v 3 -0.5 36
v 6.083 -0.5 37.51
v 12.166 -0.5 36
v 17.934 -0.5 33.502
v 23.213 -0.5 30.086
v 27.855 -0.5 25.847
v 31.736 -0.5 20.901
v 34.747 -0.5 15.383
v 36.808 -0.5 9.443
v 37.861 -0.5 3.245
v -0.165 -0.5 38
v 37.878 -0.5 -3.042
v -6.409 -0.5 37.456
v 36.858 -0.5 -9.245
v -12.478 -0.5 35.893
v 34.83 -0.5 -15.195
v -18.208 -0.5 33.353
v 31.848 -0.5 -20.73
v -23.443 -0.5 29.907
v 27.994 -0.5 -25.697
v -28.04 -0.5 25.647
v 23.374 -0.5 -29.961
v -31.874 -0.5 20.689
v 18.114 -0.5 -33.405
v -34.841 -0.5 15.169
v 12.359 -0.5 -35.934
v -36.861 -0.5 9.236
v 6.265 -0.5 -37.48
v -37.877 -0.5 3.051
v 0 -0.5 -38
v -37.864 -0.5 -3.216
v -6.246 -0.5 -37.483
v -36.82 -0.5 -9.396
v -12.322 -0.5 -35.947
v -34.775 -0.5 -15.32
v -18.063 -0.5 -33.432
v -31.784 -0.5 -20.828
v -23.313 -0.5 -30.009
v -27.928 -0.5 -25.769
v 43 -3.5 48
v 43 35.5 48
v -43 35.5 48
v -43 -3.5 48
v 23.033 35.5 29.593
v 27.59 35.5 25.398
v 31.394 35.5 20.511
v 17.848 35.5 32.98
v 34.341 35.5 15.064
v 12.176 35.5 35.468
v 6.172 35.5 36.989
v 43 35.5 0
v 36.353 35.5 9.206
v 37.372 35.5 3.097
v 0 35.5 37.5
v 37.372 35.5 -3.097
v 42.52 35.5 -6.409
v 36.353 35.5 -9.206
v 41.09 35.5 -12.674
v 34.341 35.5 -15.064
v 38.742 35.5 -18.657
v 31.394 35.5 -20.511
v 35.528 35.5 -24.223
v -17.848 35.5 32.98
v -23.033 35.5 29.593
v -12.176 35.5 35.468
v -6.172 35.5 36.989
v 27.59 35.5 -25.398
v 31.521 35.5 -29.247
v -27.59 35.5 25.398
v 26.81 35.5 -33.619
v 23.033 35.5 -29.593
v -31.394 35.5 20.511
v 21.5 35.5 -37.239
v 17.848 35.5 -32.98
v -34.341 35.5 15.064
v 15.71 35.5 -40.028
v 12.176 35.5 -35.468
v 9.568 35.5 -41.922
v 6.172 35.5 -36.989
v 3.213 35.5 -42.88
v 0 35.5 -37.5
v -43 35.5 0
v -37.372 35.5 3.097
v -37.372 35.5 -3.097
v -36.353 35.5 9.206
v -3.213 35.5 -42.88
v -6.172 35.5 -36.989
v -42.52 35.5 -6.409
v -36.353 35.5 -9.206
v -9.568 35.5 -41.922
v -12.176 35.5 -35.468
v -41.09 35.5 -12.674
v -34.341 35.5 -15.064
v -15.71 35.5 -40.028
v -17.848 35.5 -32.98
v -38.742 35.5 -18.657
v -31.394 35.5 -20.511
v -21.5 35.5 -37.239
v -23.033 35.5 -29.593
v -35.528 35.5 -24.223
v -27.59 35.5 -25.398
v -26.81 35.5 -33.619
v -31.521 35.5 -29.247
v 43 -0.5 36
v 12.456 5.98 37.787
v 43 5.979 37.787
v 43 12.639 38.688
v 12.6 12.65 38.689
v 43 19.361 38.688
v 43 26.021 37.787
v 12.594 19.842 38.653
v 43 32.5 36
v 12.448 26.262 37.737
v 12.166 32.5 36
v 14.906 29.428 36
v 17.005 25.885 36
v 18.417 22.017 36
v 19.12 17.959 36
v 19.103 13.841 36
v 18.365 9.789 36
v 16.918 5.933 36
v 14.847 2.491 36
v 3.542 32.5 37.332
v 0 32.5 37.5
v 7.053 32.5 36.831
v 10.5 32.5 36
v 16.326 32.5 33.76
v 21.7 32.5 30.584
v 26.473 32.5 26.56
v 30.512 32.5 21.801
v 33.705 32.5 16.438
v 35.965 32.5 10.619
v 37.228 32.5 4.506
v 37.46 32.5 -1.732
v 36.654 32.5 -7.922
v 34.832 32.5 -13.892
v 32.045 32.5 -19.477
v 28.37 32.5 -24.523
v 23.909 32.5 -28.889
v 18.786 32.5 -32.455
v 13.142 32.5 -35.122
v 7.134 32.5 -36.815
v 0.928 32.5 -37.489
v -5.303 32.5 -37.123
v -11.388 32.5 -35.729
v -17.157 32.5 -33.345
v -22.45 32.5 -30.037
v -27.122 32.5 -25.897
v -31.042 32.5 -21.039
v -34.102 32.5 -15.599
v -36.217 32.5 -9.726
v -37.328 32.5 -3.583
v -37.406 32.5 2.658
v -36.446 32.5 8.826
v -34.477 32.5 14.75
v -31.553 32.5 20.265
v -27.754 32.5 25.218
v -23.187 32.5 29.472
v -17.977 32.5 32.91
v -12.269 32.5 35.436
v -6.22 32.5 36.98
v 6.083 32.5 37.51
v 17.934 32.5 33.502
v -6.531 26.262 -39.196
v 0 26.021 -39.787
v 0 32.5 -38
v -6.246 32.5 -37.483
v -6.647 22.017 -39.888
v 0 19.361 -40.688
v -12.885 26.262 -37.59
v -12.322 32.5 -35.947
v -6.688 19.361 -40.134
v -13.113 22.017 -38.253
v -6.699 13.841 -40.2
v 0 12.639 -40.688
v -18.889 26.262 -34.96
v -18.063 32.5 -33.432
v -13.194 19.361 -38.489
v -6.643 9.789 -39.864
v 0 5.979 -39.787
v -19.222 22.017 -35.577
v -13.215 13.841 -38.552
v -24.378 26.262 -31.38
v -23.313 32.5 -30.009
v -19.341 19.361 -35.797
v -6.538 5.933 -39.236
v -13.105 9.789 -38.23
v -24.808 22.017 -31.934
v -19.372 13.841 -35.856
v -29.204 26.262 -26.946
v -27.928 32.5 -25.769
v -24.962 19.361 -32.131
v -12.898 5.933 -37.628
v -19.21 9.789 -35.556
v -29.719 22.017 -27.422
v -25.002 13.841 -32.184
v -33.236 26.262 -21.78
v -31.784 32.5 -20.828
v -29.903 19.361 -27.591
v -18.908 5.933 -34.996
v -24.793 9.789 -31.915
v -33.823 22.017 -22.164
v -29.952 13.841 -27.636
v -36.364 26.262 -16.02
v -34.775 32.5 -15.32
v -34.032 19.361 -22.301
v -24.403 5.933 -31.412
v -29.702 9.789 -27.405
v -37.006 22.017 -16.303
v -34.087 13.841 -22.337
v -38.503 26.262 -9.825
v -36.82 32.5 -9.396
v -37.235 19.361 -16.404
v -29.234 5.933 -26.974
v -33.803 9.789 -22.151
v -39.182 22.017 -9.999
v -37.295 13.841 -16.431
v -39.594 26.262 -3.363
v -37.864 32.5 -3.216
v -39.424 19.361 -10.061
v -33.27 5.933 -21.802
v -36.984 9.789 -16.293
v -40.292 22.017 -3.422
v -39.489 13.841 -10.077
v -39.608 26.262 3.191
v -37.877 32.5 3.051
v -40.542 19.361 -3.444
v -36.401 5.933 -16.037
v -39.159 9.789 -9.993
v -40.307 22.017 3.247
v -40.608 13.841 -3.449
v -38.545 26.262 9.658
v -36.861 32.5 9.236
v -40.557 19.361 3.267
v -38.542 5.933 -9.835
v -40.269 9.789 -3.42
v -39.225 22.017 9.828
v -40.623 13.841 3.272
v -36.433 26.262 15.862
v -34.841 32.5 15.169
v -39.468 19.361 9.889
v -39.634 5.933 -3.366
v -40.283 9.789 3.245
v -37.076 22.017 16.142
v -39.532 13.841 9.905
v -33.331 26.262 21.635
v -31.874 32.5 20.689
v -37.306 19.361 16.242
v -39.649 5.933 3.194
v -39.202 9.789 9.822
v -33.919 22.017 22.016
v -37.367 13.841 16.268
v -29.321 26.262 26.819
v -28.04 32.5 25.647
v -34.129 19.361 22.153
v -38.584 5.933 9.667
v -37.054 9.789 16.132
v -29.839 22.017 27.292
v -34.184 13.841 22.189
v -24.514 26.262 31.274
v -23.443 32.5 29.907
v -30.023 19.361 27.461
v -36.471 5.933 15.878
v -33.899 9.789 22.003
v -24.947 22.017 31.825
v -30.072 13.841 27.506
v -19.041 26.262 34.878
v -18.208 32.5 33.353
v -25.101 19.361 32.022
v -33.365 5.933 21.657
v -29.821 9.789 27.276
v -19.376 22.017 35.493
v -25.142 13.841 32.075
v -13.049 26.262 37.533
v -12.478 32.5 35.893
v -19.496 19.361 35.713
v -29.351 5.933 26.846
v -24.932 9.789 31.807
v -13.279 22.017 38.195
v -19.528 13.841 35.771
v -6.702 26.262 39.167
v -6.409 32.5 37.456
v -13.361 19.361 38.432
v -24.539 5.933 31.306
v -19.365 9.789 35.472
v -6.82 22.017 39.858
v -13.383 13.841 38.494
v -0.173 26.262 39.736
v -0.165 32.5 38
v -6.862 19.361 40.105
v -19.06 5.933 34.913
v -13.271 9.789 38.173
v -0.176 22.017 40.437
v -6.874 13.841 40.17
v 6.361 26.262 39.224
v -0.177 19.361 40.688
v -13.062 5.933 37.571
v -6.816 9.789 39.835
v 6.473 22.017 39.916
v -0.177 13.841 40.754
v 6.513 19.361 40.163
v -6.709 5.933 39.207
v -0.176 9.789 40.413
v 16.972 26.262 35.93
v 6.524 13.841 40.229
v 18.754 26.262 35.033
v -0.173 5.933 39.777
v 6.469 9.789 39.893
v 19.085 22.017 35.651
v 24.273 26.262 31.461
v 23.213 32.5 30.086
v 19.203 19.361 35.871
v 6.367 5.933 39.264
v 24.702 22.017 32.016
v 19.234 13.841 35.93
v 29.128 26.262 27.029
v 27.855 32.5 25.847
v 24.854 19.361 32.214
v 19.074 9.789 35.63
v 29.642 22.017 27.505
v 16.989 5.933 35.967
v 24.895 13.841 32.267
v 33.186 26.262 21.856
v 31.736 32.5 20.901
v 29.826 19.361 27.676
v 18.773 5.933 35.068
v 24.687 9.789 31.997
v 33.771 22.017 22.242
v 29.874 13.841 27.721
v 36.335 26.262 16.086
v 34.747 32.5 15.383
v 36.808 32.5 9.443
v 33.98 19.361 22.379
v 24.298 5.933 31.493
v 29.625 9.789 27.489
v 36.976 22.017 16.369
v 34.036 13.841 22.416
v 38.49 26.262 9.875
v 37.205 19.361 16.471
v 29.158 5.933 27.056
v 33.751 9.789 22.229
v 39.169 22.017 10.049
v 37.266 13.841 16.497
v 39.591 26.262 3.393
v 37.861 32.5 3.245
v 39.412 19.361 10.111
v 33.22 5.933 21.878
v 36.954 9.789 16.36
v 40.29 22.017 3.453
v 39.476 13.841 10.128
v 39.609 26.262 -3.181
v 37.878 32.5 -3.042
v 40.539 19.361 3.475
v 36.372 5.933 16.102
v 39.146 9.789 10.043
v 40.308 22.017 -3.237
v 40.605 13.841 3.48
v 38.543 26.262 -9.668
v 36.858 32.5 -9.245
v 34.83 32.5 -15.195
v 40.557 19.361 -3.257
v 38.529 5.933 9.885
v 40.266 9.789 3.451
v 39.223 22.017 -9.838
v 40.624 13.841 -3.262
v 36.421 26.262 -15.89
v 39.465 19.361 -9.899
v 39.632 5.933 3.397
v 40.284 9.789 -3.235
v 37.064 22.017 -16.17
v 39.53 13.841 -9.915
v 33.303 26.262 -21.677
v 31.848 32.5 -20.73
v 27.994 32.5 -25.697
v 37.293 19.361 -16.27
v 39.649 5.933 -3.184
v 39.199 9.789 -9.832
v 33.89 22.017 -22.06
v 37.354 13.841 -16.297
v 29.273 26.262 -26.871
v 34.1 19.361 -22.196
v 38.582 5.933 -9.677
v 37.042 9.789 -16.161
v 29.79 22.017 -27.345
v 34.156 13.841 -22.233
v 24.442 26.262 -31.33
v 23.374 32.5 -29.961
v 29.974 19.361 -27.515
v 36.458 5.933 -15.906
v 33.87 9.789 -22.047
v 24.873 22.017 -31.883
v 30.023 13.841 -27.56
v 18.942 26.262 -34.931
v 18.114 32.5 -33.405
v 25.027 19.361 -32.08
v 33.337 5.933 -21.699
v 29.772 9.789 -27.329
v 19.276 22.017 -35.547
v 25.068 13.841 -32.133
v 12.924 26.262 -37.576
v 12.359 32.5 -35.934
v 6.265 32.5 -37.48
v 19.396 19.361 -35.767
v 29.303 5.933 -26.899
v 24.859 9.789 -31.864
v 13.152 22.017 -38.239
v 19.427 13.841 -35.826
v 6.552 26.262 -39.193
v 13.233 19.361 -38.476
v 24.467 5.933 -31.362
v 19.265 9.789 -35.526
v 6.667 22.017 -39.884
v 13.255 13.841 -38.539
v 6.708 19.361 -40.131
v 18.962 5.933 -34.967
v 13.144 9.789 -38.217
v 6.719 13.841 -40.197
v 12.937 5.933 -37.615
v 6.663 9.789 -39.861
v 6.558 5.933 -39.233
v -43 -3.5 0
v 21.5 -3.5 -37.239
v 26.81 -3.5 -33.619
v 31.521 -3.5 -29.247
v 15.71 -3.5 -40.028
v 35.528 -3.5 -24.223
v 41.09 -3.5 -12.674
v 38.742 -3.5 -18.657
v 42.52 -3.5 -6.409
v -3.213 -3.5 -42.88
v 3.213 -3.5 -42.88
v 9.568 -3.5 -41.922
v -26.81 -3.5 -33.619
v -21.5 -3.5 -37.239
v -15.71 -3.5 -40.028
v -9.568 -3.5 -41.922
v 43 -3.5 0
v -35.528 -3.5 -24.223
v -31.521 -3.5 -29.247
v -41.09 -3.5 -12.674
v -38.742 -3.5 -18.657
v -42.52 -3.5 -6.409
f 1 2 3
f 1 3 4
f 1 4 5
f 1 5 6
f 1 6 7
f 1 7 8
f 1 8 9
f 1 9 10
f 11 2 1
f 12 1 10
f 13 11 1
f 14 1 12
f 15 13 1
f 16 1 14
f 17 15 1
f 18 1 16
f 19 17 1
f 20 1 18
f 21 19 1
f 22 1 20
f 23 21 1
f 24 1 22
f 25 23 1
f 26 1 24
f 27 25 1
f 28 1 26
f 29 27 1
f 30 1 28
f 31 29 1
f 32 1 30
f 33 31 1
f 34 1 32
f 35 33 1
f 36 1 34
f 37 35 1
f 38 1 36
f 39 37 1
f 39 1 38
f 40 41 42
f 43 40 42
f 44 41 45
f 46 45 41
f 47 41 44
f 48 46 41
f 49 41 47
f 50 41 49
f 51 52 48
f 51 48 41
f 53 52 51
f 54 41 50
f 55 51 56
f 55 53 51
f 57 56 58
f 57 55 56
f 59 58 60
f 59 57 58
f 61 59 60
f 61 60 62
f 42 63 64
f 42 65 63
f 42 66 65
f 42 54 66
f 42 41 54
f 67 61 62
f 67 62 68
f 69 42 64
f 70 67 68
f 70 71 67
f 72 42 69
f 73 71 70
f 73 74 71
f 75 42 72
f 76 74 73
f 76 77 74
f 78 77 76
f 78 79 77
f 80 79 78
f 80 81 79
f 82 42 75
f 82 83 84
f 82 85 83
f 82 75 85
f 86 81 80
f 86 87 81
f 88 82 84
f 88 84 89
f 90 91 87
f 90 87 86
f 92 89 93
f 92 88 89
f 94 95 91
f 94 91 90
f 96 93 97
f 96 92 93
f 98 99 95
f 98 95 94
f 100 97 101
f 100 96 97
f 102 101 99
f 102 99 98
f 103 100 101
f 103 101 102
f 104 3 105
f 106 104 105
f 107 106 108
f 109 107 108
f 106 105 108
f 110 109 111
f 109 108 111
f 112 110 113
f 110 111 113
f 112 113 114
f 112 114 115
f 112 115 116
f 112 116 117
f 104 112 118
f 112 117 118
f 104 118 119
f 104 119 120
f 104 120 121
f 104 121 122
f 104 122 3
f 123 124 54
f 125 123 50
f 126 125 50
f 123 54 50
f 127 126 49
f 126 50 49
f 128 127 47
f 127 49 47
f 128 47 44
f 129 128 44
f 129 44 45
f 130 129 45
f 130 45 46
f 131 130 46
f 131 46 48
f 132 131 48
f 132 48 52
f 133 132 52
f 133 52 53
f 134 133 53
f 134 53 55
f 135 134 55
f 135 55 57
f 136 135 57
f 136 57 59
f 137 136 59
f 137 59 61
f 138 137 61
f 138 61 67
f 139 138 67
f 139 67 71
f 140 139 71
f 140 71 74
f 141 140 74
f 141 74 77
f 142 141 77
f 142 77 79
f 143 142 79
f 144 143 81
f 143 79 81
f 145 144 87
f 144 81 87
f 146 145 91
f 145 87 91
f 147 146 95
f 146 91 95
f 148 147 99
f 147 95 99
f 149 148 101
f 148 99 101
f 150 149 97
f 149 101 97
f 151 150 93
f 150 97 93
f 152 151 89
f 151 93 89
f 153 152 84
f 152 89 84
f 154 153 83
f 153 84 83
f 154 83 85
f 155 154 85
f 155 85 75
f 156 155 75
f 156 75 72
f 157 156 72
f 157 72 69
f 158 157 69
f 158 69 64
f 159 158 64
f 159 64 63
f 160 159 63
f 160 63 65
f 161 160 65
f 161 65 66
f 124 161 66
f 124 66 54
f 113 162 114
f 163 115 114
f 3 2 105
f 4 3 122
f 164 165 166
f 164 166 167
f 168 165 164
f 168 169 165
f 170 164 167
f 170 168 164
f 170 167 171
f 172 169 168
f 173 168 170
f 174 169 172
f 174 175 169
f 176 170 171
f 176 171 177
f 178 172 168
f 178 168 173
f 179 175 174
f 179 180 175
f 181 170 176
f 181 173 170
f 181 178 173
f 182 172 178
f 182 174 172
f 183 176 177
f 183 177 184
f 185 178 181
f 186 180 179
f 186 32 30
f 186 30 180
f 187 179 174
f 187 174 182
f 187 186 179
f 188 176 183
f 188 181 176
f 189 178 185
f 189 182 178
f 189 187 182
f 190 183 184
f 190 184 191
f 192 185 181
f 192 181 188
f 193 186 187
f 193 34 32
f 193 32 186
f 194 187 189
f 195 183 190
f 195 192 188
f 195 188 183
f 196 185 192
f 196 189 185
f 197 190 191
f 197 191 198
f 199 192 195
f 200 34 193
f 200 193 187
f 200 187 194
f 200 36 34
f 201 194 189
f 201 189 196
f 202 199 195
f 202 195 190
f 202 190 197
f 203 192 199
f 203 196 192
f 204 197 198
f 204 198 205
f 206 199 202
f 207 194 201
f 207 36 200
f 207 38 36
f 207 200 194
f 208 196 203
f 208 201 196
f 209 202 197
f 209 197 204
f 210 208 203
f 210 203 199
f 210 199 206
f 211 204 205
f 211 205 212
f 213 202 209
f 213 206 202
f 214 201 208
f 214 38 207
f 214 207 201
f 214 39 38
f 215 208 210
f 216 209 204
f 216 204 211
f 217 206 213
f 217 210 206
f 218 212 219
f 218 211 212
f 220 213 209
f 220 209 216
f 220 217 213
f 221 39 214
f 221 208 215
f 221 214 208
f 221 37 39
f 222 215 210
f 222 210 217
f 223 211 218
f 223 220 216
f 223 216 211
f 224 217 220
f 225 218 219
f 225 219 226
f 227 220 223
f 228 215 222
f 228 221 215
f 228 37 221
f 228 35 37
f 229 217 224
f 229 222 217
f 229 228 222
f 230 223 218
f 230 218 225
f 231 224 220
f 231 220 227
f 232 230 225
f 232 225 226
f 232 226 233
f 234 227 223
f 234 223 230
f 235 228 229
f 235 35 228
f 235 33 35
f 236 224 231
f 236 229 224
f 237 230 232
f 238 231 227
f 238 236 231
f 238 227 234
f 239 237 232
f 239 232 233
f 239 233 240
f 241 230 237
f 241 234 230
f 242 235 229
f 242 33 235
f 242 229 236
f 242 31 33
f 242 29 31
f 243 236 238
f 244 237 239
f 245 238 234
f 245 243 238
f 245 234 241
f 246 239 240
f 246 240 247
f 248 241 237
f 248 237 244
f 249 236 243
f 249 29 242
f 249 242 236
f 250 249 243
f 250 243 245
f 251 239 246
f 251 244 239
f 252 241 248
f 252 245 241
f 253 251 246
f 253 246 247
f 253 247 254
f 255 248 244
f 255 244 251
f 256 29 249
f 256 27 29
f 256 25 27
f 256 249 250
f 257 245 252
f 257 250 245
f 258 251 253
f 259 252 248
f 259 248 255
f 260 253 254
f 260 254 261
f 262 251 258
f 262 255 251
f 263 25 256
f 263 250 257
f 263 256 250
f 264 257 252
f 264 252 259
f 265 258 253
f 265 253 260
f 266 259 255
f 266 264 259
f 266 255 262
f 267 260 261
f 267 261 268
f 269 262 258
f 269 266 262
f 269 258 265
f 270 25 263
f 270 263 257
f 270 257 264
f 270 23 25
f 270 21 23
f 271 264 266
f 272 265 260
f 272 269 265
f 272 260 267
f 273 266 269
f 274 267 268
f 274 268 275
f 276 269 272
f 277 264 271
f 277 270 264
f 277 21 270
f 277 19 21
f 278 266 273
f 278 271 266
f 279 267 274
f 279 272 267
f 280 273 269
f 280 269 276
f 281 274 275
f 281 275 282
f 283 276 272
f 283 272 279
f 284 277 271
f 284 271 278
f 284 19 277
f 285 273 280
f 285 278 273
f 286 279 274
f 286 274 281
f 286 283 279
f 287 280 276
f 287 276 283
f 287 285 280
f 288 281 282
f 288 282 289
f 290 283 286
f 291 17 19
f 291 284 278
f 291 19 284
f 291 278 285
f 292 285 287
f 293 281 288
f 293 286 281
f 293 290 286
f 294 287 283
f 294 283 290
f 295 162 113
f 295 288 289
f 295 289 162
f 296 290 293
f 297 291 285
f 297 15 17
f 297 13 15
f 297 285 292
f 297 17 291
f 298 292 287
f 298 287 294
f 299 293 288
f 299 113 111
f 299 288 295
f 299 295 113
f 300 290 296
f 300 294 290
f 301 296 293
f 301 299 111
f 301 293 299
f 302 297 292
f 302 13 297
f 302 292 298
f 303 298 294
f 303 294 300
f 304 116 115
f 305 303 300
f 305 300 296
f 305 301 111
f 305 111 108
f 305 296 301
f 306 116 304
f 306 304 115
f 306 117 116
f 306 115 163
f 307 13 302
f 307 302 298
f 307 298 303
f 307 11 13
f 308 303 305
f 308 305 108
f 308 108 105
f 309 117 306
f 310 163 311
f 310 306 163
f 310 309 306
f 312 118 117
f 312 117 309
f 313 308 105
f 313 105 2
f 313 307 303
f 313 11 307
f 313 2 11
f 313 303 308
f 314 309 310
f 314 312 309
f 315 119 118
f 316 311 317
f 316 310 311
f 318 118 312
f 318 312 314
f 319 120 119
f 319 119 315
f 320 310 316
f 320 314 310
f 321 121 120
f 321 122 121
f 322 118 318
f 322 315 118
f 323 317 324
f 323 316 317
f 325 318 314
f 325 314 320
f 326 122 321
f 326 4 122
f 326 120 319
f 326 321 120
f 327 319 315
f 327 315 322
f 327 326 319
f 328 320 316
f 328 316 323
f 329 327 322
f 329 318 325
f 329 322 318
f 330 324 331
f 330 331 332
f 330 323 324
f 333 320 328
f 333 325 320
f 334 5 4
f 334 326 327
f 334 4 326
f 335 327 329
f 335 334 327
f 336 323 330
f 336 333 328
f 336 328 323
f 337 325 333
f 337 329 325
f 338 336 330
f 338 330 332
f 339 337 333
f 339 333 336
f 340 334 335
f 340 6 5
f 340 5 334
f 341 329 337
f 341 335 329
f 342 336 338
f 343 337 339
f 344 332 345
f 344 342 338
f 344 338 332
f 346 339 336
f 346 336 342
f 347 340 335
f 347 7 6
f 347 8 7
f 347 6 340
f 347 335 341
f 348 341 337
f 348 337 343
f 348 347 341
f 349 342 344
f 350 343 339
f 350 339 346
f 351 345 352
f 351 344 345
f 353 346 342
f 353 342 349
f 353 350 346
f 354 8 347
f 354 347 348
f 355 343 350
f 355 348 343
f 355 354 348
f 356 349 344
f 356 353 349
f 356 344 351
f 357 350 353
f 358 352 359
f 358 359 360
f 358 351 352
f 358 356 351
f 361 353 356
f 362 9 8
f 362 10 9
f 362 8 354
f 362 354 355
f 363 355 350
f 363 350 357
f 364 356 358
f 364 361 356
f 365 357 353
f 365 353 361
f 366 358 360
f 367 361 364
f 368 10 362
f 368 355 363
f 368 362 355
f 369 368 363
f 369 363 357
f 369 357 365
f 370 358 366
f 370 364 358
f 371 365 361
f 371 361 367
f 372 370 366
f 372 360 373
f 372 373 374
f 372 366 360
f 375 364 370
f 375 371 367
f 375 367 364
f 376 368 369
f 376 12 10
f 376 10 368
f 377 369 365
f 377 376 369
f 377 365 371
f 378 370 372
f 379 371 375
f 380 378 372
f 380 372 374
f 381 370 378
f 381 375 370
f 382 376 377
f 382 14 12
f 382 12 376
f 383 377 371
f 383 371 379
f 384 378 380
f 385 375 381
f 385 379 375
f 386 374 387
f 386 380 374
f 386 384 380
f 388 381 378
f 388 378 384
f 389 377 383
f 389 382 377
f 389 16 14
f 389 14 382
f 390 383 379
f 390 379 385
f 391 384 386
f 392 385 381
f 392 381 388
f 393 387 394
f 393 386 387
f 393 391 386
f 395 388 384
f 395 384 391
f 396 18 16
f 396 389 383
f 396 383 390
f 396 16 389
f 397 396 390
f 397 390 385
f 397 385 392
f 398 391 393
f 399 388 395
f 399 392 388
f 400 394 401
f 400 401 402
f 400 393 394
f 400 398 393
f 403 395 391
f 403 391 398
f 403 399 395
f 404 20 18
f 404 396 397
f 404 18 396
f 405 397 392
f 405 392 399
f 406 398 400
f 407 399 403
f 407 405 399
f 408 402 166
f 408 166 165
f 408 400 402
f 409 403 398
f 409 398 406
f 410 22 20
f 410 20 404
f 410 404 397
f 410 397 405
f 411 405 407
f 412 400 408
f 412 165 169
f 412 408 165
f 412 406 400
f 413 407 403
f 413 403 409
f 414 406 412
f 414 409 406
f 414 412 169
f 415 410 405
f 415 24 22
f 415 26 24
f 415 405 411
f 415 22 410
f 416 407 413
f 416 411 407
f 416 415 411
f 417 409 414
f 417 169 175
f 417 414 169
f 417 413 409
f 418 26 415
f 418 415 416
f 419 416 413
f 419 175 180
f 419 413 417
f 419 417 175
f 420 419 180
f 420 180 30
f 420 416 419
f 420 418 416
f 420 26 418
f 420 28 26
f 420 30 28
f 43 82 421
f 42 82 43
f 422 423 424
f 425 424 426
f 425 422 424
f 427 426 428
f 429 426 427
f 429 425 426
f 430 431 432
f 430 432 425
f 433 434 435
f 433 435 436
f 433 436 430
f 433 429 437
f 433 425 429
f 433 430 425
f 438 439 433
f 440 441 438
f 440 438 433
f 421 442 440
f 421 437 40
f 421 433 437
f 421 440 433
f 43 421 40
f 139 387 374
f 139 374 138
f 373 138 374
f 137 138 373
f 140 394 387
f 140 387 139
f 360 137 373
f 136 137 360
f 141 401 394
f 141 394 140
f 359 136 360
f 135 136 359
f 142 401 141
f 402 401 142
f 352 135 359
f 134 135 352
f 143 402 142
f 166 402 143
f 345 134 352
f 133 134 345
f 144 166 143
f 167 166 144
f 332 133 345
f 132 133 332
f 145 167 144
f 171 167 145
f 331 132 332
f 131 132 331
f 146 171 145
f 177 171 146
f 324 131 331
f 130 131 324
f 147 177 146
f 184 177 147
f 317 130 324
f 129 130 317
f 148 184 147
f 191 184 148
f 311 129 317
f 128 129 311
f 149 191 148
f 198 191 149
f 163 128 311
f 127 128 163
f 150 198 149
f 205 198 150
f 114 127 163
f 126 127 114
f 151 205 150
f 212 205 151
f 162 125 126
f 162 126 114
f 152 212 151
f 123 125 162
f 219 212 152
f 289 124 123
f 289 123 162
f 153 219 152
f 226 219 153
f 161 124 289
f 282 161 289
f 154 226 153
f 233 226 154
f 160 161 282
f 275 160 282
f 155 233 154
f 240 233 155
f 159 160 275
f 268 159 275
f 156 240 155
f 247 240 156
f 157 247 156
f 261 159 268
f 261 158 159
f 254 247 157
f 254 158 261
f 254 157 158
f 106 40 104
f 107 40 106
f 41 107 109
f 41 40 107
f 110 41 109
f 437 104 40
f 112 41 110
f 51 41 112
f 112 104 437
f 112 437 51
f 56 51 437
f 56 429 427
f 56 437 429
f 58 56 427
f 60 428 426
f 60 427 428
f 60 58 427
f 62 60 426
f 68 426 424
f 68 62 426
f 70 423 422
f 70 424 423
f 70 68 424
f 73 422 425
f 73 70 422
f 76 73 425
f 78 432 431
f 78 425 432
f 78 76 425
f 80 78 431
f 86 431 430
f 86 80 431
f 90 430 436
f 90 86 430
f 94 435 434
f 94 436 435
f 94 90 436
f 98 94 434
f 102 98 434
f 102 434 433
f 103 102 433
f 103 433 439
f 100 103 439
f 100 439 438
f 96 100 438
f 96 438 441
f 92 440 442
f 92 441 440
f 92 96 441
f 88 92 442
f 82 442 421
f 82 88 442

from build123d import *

# Parameters (mm, degrees)
SKETCH2_R               = 37.5
CUT_EXTRUDE1_DEPTH      = 3
BOSS_EXTRUDE1_DEPTH     = 39
CUT_EXTRUDE2_DEPTH      = 105.691212621
CUT_EXTRUDE2_DEPTH_BACK = 40


with BuildPart() as part:
    # Sketch1 → Revolve1 (revolve)
    with BuildSketch(Plane.XY, mode=Mode.PRIVATE) as revolve1_sk:
        with BuildLine():
            Line((38, -0.5), (0, -0.5))
            Line((0, -0.5), (0, -3.5))
            Line((0, -3.5), (43, -3.5))
            Line((43, -3.5), (43, 35.5))
            Line((43, 35.5), (0, 35.5))
            Line((0, 35.5), (0, 32.5))
            Line((0, 32.5), (38, 32.5))
            ThreePointArc((38, 32.5), (40.800953399, 16), (38, -0.5))
        make_face()
    revolve(revolve1_sk.sketch.rotate(Axis((0, -0.5, 0), (0, 1, 0)), 90), axis=Axis((0, -0.5, 0), (0, 1, 0)))

    # Sketch2 → Cut-Extrude1 (cut)
    with BuildSketch(Plane(origin=(0, 35.5, 0), x_dir=(1, 0, 0), z_dir=(0, 1, 0))):
        with Locations(Location((0, 0, 0), (0, 0, 270))):
            Circle(SKETCH2_R)
    extrude(amount=-CUT_EXTRUDE1_DEPTH, mode=Mode.SUBTRACT)

    # Sketch3 → Boss-Extrude1 (add)
    with BuildSketch(Plane(origin=(0, 35.5, 0), x_dir=(1, 0, 0), z_dir=(0, 1, 0))):
        with BuildLine():
            ThreePointArc((0, -43), (-30.405591591, -30.405591591), (-43, 0))
            Line((-43, 0), (-43, -43))
            Line((-43, -43), (0, -43))
        make_face()
        with BuildLine():
            Line((43, -43), (43, 0))
            ThreePointArc((43, 0), (30.405591591, -30.405591591), (0, -43))
            Line((0, -43), (43, -43))
        make_face()
        Polygon((43, -43), (43, -48), (-43, -48), (-43, -43), (0, -43), align=None)
    extrude(amount=-BOSS_EXTRUDE1_DEPTH)

    # Sketch4 → Cut-Extrude2 (cut, two sides: drawn at the far end of the back side and taken through both)
    with BuildSketch(Plane(origin=(43, 0, 0), x_dir=(0, 0, -1), z_dir=(1, 0, 0)).offset(-CUT_EXTRUDE2_DEPTH_BACK)):
        with BuildLine():
            Line((-36, 32.5), (-36, -0.5))
            ThreePointArc((-36, -0.5), (-38.800953399, 16), (-36, 32.5))
        make_face()
    extrude(amount=CUT_EXTRUDE2_DEPTH + CUT_EXTRUDE2_DEPTH_BACK, mode=Mode.SUBTRACT)


solid = part.part
